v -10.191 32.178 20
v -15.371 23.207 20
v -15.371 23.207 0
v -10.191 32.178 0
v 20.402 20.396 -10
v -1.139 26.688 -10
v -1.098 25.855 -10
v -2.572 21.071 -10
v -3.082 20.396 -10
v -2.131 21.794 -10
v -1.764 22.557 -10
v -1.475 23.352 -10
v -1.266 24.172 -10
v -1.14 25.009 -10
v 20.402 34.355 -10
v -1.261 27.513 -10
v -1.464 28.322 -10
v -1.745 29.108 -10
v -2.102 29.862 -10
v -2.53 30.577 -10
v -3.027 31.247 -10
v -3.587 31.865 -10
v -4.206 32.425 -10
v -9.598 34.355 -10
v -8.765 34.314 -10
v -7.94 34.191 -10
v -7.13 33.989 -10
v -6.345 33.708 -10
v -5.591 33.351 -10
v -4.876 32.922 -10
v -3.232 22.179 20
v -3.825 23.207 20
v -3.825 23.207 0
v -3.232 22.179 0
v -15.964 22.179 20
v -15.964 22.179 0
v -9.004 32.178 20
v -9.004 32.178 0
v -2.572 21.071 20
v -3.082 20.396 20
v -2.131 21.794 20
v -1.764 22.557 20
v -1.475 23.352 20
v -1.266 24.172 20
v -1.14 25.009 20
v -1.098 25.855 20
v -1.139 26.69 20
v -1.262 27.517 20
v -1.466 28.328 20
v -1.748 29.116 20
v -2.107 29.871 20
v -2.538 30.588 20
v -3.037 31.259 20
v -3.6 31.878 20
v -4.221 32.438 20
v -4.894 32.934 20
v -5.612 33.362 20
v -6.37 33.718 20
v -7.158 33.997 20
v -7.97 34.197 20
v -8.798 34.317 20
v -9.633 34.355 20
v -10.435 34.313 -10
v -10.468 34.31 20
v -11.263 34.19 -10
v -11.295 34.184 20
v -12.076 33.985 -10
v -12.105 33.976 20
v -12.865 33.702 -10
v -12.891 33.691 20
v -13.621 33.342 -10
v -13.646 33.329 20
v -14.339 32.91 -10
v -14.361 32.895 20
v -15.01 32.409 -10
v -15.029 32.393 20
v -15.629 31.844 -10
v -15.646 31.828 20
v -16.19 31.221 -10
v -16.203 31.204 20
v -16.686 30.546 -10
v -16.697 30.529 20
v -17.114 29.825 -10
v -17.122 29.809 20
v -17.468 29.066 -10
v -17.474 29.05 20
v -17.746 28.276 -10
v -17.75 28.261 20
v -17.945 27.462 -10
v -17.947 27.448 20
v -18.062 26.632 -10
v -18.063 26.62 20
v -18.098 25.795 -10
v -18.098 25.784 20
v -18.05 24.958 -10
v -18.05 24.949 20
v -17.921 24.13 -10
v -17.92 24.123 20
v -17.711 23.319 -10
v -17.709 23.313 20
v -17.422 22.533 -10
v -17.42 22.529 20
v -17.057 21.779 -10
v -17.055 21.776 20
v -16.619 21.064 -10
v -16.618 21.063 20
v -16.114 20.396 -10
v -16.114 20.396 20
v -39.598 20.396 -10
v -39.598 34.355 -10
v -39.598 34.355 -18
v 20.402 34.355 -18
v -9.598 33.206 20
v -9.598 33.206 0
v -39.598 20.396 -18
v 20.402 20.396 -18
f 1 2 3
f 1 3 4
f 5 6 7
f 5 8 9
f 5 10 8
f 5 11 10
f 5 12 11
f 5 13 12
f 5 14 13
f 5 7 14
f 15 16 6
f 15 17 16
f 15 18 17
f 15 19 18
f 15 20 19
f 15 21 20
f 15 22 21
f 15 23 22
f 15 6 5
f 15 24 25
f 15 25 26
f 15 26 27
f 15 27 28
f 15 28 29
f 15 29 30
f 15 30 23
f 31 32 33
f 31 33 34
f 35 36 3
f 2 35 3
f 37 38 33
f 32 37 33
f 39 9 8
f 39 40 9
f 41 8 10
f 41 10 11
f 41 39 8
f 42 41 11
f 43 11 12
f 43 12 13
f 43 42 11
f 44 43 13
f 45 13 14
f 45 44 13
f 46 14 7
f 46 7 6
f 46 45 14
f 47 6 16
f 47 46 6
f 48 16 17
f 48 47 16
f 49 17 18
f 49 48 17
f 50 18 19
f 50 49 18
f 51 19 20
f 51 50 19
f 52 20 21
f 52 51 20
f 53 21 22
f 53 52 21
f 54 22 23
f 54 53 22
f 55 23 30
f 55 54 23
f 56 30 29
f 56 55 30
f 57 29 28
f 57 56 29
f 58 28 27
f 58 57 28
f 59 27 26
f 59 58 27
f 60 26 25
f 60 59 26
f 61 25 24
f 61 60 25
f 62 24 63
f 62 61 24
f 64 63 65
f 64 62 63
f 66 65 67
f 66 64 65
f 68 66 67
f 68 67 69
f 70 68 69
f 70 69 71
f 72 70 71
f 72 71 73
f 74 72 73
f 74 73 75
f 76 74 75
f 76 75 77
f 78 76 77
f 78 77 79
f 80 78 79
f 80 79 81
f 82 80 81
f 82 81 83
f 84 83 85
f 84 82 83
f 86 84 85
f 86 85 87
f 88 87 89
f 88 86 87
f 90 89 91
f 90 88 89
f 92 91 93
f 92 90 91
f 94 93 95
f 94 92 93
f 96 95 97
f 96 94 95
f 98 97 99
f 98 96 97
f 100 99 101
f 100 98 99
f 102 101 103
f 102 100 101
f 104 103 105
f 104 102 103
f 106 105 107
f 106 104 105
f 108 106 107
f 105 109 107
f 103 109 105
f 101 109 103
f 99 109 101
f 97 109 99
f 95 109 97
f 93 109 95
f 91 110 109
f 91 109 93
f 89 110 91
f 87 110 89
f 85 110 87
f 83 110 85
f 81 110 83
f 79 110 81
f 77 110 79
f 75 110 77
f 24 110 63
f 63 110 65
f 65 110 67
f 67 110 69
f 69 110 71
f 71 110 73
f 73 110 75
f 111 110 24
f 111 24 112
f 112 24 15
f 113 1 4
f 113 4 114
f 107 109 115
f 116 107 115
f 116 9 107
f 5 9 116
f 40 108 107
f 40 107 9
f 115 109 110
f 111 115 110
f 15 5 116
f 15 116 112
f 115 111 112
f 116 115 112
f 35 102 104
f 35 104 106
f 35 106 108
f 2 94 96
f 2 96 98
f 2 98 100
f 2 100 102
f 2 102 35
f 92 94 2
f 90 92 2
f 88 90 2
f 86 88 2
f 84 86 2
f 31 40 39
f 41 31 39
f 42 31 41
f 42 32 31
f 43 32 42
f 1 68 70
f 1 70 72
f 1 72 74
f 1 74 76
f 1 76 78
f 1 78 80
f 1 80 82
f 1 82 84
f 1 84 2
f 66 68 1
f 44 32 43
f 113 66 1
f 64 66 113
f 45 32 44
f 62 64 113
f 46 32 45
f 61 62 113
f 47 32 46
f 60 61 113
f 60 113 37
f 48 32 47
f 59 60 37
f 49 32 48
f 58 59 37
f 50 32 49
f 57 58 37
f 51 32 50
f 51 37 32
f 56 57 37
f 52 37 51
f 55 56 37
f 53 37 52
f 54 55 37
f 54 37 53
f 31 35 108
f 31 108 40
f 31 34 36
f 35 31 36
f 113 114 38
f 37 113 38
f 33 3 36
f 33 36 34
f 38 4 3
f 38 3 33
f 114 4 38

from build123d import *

# Parameters (mm, degrees)
F1_DEPTH = 20
F3_DEPTH = 10
F4_START = -10
F2_W     = 60
F2_H     = 13.958594691
F4_DEPTH = 8


with BuildPart() as f1:
    # F0 (on Top) → F1 (new body)
    with BuildSketch(Plane.XY):
        with BuildLine():
            ThreePointArc((-10.1912790055, 32.1777615839), (-15.0978885502, 29.0301175207), (-15.3705234986, 23.207046977))
            Line((-15.3705234986, 23.207046977), (-10.1912790055, 32.1777615839))
        make_face()
        with BuildLine():
            ThreePointArc((-3.2470355891, 25.8546910402), (-4.9020463007, 30.130483236), (-9.0044980948, 32.1777615839))
            Line((-9.0044980948, 32.1777615839), (-3.8252536017, 23.207046977))
            ThreePointArc((-3.8252536017, 23.207046977), (-3.3932737721, 24.4996675021), (-3.2470355891, 25.8546910402))
        make_face()
        with BuildLine():
            Line((-15.9639139539, 22.1792645596), (-15.3705234986, 23.207046977))
            ThreePointArc((-15.3705234986, 23.207046977), (-15.0978885502, 29.0301175207), (-10.1912790055, 32.1777615839))
            Line((-10.1912790055, 32.1777615839), (-9.5978885502, 33.2055440013))
            Line((-9.5978885502, 33.2055440013), (-9.0044980948, 32.1777615839))
            ThreePointArc((-9.0044980948, 32.1777615839), (-4.9020463007, 30.130483236), (-3.2470355891, 25.8546910402))
            ThreePointArc((-3.2470355891, 25.8546910402), (-3.3932737721, 24.4996675021), (-3.8252536017, 23.207046977))
            Line((-3.8252536017, 23.207046977), (-3.2318631464, 22.1792645596))
            Line((-3.2318631464, 22.1792645596), (-4.418644057, 22.1792645596))
            ThreePointArc((-4.418644057, 22.1792645596), (-5.2919075177, 21.1865157348), (-6.351802086, 20.3960963492))
            Line((-6.351802086, 20.3960963492), (-3.0822347841, 20.3960963492))
            ThreePointArc((-3.0822347841, 20.3960963492), (-1.6093637486, 22.9506470505), (-1.0978885502, 25.8546910402))
            ThreePointArc((-1.0978885502, 25.8546910402), (-12.5019325399, 33.8432158418), (-16.1135423163, 20.3960963492))
            Line((-16.1135423163, 20.3960963492), (-12.8439750143, 20.3960963492))
            ThreePointArc((-12.8439750143, 20.3960963492), (-13.9038695826, 21.1865157348), (-14.7771330433, 22.1792645596))
            Line((-14.7771330433, 22.1792645596), (-15.9639139539, 22.1792645596))
        make_face()
        with BuildLine():
            Line((-4.418644057, 22.1792645596), (-14.7771330433, 22.1792645596))
            ThreePointArc((-14.7771330433, 22.1792645596), (-13.9038695826, 21.1865157348), (-12.8439750143, 20.3960963492))
            Line((-12.8439750143, 20.3960963492), (-6.351802086, 20.3960963492))
            ThreePointArc((-6.351802086, 20.3960963492), (-5.2919075177, 21.1865157348), (-4.418644057, 22.1792645596))
        make_face()
    extrude(amount=F1_DEPTH)

    # F0 (on Top) → F3 (join)
    with BuildSketch(Plane.XY):
        with BuildLine():
            ThreePointArc((-10.1912790055, 32.1777615839), (-15.0978885502, 29.0301175207), (-15.3705234986, 23.207046977))
            Line((-15.3705234986, 23.207046977), (-10.1912790055, 32.1777615839))
        make_face()
        Polygon((-9.5978885502, 32.2055440013), (-15.0978885502, 22.6792645596), (-4.0978885502, 22.6792645596), align=None)
        with BuildLine():
            ThreePointArc((-10.1912790055, 32.1777615839), (-9.8949087916, 32.1985945947), (-9.5978885502, 32.2055440013))
            ThreePointArc((-9.5978885502, 32.2055440013), (-9.3008683088, 32.1985945947), (-9.0044980948, 32.1777615839))
            Line((-9.0044980948, 32.1777615839), (-9.5978885502, 33.2055440013))
            Line((-9.5978885502, 33.2055440013), (-10.1912790055, 32.1777615839))
        make_face()
        with BuildLine():
            ThreePointArc((-15.3705234986, 23.207046977), (-15.2403803083, 22.9399663374), (-15.0978885502, 22.6792645596))
            Line((-15.0978885502, 22.6792645596), (-9.5978885502, 32.2055440013))
            ThreePointArc((-9.5978885502, 32.2055440013), (-9.8949087916, 32.1985945947), (-10.1912790055, 32.1777615839))
            Line((-10.1912790055, 32.1777615839), (-15.3705234986, 23.207046977))
        make_face()
        with BuildLine():
            ThreePointArc((-14.7771330433, 22.1792645596), (-14.9433600669, 22.4255121884), (-15.0978885502, 22.6792645596))
            ThreePointArc((-15.0978885502, 22.6792645596), (-15.2403803083, 22.9399663374), (-15.3705234986, 23.207046977))
            Line((-15.3705234986, 23.207046977), (-15.9639139539, 22.1792645596))
            Line((-15.9639139539, 22.1792645596), (-14.7771330433, 22.1792645596))
        make_face()
        with BuildLine():
            Line((-15.9639139539, 22.1792645596), (-15.3705234986, 23.207046977))
            ThreePointArc((-15.3705234986, 23.207046977), (-15.0978885502, 29.0301175207), (-10.1912790055, 32.1777615839))
            Line((-10.1912790055, 32.1777615839), (-9.5978885502, 33.2055440013))
            Line((-9.5978885502, 33.2055440013), (-9.0044980948, 32.1777615839))
            ThreePointArc((-9.0044980948, 32.1777615839), (-4.9020463007, 30.130483236), (-3.2470355891, 25.8546910402))
            ThreePointArc((-3.2470355891, 25.8546910402), (-3.3932737721, 24.4996675021), (-3.8252536017, 23.207046977))
            Line((-3.8252536017, 23.207046977), (-3.2318631464, 22.1792645596))
            Line((-3.2318631464, 22.1792645596), (-4.418644057, 22.1792645596))
            ThreePointArc((-4.418644057, 22.1792645596), (-5.2919075177, 21.1865157348), (-6.351802086, 20.3960963492))
            Line((-6.351802086, 20.3960963492), (-3.0822347841, 20.3960963492))
            ThreePointArc((-3.0822347841, 20.3960963492), (-1.6093637486, 22.9506470505), (-1.0978885502, 25.8546910402))
            ThreePointArc((-1.0978885502, 25.8546910402), (-12.5019325399, 33.8432158418), (-16.1135423163, 20.3960963492))
            Line((-16.1135423163, 20.3960963492), (-12.8439750143, 20.3960963492))
            ThreePointArc((-12.8439750143, 20.3960963492), (-13.9038695826, 21.1865157348), (-14.7771330433, 22.1792645596))
            Line((-14.7771330433, 22.1792645596), (-15.9639139539, 22.1792645596))
        make_face()
        with BuildLine():
            Line((-4.418644057, 22.1792645596), (-14.7771330433, 22.1792645596))
            ThreePointArc((-14.7771330433, 22.1792645596), (-13.9038695826, 21.1865157348), (-12.8439750143, 20.3960963492))
            Line((-12.8439750143, 20.3960963492), (-6.351802086, 20.3960963492))
            ThreePointArc((-6.351802086, 20.3960963492), (-5.2919075177, 21.1865157348), (-4.418644057, 22.1792645596))
        make_face()
        with BuildLine():
            ThreePointArc((-3.2470355891, 25.8546910402), (-4.9020463007, 30.130483236), (-9.0044980948, 32.1777615839))
            Line((-9.0044980948, 32.1777615839), (-3.8252536017, 23.207046977))
            ThreePointArc((-3.8252536017, 23.207046977), (-3.3932737721, 24.4996675021), (-3.2470355891, 25.8546910402))
        make_face()
        with BuildLine():
            ThreePointArc((-9.0044980948, 32.1777615839), (-9.3008683088, 32.1985945947), (-9.5978885502, 32.2055440013))
            Line((-9.5978885502, 32.2055440013), (-4.0978885502, 22.6792645596))
            ThreePointArc((-4.0978885502, 22.6792645596), (-3.9553967921, 22.9399663374), (-3.8252536017, 23.207046977))
            Line((-3.8252536017, 23.207046977), (-9.0044980948, 32.1777615839))
        make_face()
        with BuildLine():
            Line((-4.0978885502, 22.6792645596), (-15.0978885502, 22.6792645596))
            ThreePointArc((-15.0978885502, 22.6792645596), (-14.9433600669, 22.4255121884), (-14.7771330433, 22.1792645596))
            Line((-14.7771330433, 22.1792645596), (-4.418644057, 22.1792645596))
            ThreePointArc((-4.418644057, 22.1792645596), (-4.2524170335, 22.4255121884), (-4.0978885502, 22.6792645596))
        make_face()
        with BuildLine():
            ThreePointArc((-3.8252536017, 23.207046977), (-3.9553967921, 22.9399663374), (-4.0978885502, 22.6792645596))
            ThreePointArc((-4.0978885502, 22.6792645596), (-4.2524170335, 22.4255121884), (-4.418644057, 22.1792645596))
            Line((-4.418644057, 22.1792645596), (-3.2318631464, 22.1792645596))
            Line((-3.2318631464, 22.1792645596), (-3.8252536017, 23.207046977))
        make_face()
    extrude(amount=-F3_DEPTH)

    # F2 (on Top) → F4 (join)
    with BuildSketch(Plane.XY.offset(F4_START)):
        with Locations((-9.5978885502, 27.3753936947)):
            Rectangle(F2_W, F2_H)
    extrude(amount=-F4_DEPTH)


solid = f1.part
